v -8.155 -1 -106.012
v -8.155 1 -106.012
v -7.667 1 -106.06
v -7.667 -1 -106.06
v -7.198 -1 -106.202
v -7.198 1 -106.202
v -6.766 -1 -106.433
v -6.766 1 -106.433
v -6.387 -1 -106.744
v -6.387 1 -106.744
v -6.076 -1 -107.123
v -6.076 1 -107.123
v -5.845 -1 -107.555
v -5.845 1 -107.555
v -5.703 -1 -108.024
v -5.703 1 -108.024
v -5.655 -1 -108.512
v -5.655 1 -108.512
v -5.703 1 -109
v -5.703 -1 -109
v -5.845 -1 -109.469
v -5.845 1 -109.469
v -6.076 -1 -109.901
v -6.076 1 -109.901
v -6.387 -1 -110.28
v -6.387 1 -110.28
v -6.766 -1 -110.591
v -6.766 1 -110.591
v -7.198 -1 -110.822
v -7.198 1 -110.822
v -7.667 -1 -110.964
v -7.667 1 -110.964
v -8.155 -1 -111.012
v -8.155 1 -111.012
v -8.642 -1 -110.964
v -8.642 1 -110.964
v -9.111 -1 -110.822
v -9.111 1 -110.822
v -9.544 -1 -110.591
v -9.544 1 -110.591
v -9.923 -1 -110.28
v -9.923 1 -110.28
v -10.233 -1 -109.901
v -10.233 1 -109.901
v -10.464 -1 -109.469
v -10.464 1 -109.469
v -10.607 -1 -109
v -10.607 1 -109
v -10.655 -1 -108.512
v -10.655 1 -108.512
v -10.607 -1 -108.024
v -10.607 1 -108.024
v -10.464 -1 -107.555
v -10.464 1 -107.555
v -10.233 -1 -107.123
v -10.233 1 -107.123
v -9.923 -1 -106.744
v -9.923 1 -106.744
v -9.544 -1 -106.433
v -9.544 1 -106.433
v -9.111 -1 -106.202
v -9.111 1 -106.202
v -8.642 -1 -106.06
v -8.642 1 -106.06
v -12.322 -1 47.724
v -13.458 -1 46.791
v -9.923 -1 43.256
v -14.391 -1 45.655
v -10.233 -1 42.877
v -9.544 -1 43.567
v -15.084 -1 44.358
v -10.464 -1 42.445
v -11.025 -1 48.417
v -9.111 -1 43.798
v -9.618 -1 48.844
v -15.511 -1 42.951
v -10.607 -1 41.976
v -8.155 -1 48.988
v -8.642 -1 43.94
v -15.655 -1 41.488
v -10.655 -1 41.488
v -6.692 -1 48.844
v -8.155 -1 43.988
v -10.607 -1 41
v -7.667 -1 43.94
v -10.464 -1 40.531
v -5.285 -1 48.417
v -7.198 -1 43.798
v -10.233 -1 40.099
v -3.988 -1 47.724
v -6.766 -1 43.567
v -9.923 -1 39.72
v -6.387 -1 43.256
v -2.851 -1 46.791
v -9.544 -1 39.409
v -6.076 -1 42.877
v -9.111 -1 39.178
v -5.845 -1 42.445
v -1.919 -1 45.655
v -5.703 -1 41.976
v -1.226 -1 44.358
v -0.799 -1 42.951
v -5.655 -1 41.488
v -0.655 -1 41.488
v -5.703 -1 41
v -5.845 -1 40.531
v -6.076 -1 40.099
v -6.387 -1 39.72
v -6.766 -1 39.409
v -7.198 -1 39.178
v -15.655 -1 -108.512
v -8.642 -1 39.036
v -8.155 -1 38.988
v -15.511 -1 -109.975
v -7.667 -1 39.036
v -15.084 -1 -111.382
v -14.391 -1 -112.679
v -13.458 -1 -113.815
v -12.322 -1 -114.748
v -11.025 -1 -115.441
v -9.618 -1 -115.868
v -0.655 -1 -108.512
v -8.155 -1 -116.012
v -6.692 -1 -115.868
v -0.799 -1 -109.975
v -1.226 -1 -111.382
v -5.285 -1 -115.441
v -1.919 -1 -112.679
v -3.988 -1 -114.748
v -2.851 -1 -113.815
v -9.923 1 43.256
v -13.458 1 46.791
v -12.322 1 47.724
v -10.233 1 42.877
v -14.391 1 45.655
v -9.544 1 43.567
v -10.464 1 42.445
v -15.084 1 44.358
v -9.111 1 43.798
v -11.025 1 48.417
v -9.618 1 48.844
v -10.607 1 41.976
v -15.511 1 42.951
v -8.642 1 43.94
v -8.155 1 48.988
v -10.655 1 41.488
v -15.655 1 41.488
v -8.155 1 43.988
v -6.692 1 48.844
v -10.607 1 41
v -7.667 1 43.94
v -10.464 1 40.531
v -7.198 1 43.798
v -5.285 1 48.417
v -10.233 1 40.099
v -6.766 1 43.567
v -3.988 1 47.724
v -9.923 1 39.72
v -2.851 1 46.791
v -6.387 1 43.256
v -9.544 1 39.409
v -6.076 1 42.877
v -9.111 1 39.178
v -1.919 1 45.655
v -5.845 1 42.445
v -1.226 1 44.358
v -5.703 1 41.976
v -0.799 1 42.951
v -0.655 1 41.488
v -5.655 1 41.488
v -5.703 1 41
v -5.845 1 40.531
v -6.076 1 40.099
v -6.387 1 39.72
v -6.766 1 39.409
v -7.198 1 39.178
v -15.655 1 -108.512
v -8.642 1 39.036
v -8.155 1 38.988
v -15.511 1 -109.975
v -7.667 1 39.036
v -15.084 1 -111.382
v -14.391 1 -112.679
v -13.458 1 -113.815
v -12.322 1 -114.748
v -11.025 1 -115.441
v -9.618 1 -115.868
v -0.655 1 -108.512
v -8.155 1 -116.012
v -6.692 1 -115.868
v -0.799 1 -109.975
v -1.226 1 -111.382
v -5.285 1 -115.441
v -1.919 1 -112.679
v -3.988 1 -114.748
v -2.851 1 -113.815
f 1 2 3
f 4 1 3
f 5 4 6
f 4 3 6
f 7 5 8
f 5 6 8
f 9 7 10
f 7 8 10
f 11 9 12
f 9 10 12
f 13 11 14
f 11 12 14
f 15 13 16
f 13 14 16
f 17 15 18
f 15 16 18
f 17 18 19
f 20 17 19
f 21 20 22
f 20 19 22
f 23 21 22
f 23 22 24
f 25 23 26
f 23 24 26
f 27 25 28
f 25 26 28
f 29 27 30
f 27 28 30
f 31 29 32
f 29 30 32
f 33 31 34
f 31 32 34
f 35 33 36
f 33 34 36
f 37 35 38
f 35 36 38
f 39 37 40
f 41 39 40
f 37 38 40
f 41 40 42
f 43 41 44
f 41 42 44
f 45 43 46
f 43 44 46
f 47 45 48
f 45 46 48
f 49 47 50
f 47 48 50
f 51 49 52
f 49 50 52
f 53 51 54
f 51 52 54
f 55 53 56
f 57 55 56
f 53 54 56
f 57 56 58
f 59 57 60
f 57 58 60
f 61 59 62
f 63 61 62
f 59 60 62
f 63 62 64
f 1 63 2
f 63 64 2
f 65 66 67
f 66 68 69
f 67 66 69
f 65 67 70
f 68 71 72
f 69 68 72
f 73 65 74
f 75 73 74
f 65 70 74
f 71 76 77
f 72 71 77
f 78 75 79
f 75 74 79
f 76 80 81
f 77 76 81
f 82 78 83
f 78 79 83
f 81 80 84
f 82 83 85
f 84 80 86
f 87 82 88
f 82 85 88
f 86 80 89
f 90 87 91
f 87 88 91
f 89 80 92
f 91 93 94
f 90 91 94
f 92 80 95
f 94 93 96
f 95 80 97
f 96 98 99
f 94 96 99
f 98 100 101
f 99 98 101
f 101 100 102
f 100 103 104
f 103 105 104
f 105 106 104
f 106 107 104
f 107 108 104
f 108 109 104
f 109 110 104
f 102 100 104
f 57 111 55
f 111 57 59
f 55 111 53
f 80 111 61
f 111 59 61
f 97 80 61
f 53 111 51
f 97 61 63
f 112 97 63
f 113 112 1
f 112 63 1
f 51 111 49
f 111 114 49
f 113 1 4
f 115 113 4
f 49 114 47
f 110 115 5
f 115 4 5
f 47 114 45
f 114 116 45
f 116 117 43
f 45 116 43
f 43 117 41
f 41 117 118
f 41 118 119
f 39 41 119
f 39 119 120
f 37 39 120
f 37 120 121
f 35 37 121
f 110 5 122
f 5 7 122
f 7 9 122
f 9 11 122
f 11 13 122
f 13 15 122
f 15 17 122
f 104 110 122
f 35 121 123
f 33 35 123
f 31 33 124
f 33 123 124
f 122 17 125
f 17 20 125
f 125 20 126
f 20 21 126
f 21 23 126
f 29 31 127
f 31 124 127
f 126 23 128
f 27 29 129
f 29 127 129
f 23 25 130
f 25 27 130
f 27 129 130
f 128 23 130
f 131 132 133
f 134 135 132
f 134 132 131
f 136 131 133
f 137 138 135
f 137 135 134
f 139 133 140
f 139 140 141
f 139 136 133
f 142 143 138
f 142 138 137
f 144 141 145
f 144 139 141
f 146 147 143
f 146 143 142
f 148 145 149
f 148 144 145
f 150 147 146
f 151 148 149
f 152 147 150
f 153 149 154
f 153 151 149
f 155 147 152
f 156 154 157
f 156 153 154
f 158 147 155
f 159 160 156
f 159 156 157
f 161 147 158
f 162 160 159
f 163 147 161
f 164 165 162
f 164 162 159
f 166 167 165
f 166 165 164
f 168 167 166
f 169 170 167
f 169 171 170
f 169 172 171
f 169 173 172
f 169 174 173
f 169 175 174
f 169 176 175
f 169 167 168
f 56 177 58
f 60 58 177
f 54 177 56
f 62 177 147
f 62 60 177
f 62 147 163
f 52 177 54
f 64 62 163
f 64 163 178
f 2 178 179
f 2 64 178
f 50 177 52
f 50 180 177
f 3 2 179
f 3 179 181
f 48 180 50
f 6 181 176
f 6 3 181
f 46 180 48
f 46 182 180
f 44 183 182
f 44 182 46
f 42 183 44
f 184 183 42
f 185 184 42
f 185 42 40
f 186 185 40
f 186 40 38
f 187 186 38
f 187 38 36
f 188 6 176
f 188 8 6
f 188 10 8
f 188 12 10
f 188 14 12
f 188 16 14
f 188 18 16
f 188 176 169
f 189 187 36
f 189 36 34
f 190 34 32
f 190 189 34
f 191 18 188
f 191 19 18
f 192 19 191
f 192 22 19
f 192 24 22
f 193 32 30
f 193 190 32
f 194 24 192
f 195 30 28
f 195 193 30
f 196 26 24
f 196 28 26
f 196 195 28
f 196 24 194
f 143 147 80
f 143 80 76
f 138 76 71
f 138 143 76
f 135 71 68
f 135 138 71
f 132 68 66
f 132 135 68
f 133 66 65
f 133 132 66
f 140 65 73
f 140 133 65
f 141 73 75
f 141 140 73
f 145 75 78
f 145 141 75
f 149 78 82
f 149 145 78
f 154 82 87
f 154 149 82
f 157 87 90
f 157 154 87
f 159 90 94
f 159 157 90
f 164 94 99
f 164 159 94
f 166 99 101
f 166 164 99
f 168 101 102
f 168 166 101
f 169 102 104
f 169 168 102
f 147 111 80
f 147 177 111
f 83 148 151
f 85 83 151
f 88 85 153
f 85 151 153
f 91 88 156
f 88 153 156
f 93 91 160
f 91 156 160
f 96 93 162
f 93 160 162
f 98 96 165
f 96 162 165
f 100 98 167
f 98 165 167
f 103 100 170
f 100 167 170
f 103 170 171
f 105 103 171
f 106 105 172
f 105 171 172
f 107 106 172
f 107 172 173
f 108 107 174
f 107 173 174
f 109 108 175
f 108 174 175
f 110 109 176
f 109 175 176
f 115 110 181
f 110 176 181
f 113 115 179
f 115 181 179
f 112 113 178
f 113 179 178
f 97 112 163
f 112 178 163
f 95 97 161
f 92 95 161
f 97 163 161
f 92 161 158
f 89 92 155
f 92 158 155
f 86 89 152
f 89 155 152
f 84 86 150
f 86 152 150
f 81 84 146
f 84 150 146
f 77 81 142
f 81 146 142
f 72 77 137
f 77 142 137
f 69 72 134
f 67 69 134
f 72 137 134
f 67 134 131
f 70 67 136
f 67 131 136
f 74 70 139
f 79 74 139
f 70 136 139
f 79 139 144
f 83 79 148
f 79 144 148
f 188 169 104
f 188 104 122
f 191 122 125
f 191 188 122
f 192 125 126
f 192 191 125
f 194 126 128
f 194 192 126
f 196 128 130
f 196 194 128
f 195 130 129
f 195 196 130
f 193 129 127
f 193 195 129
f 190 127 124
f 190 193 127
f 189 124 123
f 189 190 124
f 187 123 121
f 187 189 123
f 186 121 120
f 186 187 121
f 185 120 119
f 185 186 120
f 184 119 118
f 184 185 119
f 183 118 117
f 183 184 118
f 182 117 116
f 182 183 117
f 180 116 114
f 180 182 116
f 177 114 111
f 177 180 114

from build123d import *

# Parameters (mm, degrees)
BOSS_EXTRUDE1_DEPTH = 1
SKETCH3_R           = 2.5
CUT_EXTRUDE2_DEPTH  = 2


with BuildPart() as part:
    # Sketch1 → Boss-Extrude1 (new, symmetric)
    with BuildSketch(Plane(origin=(0, 0, 0), x_dir=(1, 0, 0), z_dir=(0, 1, 0))):
        with BuildLine():
            Line((-15.654761905, 108.511904762), (-15.654761905, -41.488095238))
            ThreePointArc((-15.654761905, -41.488095238), (-8.154761905, -48.988095238), (-0.654761905, -41.488095238))
            Line((-0.654761905, -41.488095238), (-0.654761905, 108.511904762))
            ThreePointArc((-0.654761905, 108.511904762), (-8.154761905, 116.011904762), (-15.654761905, 108.511904762))
        make_face()
    extrude(amount=BOSS_EXTRUDE1_DEPTH, both=True)

    # Sketch3 → Cut-Extrude2 (cut)
    with BuildSketch(Plane(origin=(0, 1, 0), x_dir=(1, 0, 0), z_dir=(0, 1, 0))):
        with Locations(Location((-8.154761905, 108.511904762, 0), (0, 0, 270))):
            Circle(SKETCH3_R)
        with Locations(Location((-8.154761905, -41.488095238, 0), (0, 0, 270))):
            Circle(SKETCH3_R)
    extrude(amount=-CUT_EXTRUDE2_DEPTH, mode=Mode.SUBTRACT)


solid = part.part
